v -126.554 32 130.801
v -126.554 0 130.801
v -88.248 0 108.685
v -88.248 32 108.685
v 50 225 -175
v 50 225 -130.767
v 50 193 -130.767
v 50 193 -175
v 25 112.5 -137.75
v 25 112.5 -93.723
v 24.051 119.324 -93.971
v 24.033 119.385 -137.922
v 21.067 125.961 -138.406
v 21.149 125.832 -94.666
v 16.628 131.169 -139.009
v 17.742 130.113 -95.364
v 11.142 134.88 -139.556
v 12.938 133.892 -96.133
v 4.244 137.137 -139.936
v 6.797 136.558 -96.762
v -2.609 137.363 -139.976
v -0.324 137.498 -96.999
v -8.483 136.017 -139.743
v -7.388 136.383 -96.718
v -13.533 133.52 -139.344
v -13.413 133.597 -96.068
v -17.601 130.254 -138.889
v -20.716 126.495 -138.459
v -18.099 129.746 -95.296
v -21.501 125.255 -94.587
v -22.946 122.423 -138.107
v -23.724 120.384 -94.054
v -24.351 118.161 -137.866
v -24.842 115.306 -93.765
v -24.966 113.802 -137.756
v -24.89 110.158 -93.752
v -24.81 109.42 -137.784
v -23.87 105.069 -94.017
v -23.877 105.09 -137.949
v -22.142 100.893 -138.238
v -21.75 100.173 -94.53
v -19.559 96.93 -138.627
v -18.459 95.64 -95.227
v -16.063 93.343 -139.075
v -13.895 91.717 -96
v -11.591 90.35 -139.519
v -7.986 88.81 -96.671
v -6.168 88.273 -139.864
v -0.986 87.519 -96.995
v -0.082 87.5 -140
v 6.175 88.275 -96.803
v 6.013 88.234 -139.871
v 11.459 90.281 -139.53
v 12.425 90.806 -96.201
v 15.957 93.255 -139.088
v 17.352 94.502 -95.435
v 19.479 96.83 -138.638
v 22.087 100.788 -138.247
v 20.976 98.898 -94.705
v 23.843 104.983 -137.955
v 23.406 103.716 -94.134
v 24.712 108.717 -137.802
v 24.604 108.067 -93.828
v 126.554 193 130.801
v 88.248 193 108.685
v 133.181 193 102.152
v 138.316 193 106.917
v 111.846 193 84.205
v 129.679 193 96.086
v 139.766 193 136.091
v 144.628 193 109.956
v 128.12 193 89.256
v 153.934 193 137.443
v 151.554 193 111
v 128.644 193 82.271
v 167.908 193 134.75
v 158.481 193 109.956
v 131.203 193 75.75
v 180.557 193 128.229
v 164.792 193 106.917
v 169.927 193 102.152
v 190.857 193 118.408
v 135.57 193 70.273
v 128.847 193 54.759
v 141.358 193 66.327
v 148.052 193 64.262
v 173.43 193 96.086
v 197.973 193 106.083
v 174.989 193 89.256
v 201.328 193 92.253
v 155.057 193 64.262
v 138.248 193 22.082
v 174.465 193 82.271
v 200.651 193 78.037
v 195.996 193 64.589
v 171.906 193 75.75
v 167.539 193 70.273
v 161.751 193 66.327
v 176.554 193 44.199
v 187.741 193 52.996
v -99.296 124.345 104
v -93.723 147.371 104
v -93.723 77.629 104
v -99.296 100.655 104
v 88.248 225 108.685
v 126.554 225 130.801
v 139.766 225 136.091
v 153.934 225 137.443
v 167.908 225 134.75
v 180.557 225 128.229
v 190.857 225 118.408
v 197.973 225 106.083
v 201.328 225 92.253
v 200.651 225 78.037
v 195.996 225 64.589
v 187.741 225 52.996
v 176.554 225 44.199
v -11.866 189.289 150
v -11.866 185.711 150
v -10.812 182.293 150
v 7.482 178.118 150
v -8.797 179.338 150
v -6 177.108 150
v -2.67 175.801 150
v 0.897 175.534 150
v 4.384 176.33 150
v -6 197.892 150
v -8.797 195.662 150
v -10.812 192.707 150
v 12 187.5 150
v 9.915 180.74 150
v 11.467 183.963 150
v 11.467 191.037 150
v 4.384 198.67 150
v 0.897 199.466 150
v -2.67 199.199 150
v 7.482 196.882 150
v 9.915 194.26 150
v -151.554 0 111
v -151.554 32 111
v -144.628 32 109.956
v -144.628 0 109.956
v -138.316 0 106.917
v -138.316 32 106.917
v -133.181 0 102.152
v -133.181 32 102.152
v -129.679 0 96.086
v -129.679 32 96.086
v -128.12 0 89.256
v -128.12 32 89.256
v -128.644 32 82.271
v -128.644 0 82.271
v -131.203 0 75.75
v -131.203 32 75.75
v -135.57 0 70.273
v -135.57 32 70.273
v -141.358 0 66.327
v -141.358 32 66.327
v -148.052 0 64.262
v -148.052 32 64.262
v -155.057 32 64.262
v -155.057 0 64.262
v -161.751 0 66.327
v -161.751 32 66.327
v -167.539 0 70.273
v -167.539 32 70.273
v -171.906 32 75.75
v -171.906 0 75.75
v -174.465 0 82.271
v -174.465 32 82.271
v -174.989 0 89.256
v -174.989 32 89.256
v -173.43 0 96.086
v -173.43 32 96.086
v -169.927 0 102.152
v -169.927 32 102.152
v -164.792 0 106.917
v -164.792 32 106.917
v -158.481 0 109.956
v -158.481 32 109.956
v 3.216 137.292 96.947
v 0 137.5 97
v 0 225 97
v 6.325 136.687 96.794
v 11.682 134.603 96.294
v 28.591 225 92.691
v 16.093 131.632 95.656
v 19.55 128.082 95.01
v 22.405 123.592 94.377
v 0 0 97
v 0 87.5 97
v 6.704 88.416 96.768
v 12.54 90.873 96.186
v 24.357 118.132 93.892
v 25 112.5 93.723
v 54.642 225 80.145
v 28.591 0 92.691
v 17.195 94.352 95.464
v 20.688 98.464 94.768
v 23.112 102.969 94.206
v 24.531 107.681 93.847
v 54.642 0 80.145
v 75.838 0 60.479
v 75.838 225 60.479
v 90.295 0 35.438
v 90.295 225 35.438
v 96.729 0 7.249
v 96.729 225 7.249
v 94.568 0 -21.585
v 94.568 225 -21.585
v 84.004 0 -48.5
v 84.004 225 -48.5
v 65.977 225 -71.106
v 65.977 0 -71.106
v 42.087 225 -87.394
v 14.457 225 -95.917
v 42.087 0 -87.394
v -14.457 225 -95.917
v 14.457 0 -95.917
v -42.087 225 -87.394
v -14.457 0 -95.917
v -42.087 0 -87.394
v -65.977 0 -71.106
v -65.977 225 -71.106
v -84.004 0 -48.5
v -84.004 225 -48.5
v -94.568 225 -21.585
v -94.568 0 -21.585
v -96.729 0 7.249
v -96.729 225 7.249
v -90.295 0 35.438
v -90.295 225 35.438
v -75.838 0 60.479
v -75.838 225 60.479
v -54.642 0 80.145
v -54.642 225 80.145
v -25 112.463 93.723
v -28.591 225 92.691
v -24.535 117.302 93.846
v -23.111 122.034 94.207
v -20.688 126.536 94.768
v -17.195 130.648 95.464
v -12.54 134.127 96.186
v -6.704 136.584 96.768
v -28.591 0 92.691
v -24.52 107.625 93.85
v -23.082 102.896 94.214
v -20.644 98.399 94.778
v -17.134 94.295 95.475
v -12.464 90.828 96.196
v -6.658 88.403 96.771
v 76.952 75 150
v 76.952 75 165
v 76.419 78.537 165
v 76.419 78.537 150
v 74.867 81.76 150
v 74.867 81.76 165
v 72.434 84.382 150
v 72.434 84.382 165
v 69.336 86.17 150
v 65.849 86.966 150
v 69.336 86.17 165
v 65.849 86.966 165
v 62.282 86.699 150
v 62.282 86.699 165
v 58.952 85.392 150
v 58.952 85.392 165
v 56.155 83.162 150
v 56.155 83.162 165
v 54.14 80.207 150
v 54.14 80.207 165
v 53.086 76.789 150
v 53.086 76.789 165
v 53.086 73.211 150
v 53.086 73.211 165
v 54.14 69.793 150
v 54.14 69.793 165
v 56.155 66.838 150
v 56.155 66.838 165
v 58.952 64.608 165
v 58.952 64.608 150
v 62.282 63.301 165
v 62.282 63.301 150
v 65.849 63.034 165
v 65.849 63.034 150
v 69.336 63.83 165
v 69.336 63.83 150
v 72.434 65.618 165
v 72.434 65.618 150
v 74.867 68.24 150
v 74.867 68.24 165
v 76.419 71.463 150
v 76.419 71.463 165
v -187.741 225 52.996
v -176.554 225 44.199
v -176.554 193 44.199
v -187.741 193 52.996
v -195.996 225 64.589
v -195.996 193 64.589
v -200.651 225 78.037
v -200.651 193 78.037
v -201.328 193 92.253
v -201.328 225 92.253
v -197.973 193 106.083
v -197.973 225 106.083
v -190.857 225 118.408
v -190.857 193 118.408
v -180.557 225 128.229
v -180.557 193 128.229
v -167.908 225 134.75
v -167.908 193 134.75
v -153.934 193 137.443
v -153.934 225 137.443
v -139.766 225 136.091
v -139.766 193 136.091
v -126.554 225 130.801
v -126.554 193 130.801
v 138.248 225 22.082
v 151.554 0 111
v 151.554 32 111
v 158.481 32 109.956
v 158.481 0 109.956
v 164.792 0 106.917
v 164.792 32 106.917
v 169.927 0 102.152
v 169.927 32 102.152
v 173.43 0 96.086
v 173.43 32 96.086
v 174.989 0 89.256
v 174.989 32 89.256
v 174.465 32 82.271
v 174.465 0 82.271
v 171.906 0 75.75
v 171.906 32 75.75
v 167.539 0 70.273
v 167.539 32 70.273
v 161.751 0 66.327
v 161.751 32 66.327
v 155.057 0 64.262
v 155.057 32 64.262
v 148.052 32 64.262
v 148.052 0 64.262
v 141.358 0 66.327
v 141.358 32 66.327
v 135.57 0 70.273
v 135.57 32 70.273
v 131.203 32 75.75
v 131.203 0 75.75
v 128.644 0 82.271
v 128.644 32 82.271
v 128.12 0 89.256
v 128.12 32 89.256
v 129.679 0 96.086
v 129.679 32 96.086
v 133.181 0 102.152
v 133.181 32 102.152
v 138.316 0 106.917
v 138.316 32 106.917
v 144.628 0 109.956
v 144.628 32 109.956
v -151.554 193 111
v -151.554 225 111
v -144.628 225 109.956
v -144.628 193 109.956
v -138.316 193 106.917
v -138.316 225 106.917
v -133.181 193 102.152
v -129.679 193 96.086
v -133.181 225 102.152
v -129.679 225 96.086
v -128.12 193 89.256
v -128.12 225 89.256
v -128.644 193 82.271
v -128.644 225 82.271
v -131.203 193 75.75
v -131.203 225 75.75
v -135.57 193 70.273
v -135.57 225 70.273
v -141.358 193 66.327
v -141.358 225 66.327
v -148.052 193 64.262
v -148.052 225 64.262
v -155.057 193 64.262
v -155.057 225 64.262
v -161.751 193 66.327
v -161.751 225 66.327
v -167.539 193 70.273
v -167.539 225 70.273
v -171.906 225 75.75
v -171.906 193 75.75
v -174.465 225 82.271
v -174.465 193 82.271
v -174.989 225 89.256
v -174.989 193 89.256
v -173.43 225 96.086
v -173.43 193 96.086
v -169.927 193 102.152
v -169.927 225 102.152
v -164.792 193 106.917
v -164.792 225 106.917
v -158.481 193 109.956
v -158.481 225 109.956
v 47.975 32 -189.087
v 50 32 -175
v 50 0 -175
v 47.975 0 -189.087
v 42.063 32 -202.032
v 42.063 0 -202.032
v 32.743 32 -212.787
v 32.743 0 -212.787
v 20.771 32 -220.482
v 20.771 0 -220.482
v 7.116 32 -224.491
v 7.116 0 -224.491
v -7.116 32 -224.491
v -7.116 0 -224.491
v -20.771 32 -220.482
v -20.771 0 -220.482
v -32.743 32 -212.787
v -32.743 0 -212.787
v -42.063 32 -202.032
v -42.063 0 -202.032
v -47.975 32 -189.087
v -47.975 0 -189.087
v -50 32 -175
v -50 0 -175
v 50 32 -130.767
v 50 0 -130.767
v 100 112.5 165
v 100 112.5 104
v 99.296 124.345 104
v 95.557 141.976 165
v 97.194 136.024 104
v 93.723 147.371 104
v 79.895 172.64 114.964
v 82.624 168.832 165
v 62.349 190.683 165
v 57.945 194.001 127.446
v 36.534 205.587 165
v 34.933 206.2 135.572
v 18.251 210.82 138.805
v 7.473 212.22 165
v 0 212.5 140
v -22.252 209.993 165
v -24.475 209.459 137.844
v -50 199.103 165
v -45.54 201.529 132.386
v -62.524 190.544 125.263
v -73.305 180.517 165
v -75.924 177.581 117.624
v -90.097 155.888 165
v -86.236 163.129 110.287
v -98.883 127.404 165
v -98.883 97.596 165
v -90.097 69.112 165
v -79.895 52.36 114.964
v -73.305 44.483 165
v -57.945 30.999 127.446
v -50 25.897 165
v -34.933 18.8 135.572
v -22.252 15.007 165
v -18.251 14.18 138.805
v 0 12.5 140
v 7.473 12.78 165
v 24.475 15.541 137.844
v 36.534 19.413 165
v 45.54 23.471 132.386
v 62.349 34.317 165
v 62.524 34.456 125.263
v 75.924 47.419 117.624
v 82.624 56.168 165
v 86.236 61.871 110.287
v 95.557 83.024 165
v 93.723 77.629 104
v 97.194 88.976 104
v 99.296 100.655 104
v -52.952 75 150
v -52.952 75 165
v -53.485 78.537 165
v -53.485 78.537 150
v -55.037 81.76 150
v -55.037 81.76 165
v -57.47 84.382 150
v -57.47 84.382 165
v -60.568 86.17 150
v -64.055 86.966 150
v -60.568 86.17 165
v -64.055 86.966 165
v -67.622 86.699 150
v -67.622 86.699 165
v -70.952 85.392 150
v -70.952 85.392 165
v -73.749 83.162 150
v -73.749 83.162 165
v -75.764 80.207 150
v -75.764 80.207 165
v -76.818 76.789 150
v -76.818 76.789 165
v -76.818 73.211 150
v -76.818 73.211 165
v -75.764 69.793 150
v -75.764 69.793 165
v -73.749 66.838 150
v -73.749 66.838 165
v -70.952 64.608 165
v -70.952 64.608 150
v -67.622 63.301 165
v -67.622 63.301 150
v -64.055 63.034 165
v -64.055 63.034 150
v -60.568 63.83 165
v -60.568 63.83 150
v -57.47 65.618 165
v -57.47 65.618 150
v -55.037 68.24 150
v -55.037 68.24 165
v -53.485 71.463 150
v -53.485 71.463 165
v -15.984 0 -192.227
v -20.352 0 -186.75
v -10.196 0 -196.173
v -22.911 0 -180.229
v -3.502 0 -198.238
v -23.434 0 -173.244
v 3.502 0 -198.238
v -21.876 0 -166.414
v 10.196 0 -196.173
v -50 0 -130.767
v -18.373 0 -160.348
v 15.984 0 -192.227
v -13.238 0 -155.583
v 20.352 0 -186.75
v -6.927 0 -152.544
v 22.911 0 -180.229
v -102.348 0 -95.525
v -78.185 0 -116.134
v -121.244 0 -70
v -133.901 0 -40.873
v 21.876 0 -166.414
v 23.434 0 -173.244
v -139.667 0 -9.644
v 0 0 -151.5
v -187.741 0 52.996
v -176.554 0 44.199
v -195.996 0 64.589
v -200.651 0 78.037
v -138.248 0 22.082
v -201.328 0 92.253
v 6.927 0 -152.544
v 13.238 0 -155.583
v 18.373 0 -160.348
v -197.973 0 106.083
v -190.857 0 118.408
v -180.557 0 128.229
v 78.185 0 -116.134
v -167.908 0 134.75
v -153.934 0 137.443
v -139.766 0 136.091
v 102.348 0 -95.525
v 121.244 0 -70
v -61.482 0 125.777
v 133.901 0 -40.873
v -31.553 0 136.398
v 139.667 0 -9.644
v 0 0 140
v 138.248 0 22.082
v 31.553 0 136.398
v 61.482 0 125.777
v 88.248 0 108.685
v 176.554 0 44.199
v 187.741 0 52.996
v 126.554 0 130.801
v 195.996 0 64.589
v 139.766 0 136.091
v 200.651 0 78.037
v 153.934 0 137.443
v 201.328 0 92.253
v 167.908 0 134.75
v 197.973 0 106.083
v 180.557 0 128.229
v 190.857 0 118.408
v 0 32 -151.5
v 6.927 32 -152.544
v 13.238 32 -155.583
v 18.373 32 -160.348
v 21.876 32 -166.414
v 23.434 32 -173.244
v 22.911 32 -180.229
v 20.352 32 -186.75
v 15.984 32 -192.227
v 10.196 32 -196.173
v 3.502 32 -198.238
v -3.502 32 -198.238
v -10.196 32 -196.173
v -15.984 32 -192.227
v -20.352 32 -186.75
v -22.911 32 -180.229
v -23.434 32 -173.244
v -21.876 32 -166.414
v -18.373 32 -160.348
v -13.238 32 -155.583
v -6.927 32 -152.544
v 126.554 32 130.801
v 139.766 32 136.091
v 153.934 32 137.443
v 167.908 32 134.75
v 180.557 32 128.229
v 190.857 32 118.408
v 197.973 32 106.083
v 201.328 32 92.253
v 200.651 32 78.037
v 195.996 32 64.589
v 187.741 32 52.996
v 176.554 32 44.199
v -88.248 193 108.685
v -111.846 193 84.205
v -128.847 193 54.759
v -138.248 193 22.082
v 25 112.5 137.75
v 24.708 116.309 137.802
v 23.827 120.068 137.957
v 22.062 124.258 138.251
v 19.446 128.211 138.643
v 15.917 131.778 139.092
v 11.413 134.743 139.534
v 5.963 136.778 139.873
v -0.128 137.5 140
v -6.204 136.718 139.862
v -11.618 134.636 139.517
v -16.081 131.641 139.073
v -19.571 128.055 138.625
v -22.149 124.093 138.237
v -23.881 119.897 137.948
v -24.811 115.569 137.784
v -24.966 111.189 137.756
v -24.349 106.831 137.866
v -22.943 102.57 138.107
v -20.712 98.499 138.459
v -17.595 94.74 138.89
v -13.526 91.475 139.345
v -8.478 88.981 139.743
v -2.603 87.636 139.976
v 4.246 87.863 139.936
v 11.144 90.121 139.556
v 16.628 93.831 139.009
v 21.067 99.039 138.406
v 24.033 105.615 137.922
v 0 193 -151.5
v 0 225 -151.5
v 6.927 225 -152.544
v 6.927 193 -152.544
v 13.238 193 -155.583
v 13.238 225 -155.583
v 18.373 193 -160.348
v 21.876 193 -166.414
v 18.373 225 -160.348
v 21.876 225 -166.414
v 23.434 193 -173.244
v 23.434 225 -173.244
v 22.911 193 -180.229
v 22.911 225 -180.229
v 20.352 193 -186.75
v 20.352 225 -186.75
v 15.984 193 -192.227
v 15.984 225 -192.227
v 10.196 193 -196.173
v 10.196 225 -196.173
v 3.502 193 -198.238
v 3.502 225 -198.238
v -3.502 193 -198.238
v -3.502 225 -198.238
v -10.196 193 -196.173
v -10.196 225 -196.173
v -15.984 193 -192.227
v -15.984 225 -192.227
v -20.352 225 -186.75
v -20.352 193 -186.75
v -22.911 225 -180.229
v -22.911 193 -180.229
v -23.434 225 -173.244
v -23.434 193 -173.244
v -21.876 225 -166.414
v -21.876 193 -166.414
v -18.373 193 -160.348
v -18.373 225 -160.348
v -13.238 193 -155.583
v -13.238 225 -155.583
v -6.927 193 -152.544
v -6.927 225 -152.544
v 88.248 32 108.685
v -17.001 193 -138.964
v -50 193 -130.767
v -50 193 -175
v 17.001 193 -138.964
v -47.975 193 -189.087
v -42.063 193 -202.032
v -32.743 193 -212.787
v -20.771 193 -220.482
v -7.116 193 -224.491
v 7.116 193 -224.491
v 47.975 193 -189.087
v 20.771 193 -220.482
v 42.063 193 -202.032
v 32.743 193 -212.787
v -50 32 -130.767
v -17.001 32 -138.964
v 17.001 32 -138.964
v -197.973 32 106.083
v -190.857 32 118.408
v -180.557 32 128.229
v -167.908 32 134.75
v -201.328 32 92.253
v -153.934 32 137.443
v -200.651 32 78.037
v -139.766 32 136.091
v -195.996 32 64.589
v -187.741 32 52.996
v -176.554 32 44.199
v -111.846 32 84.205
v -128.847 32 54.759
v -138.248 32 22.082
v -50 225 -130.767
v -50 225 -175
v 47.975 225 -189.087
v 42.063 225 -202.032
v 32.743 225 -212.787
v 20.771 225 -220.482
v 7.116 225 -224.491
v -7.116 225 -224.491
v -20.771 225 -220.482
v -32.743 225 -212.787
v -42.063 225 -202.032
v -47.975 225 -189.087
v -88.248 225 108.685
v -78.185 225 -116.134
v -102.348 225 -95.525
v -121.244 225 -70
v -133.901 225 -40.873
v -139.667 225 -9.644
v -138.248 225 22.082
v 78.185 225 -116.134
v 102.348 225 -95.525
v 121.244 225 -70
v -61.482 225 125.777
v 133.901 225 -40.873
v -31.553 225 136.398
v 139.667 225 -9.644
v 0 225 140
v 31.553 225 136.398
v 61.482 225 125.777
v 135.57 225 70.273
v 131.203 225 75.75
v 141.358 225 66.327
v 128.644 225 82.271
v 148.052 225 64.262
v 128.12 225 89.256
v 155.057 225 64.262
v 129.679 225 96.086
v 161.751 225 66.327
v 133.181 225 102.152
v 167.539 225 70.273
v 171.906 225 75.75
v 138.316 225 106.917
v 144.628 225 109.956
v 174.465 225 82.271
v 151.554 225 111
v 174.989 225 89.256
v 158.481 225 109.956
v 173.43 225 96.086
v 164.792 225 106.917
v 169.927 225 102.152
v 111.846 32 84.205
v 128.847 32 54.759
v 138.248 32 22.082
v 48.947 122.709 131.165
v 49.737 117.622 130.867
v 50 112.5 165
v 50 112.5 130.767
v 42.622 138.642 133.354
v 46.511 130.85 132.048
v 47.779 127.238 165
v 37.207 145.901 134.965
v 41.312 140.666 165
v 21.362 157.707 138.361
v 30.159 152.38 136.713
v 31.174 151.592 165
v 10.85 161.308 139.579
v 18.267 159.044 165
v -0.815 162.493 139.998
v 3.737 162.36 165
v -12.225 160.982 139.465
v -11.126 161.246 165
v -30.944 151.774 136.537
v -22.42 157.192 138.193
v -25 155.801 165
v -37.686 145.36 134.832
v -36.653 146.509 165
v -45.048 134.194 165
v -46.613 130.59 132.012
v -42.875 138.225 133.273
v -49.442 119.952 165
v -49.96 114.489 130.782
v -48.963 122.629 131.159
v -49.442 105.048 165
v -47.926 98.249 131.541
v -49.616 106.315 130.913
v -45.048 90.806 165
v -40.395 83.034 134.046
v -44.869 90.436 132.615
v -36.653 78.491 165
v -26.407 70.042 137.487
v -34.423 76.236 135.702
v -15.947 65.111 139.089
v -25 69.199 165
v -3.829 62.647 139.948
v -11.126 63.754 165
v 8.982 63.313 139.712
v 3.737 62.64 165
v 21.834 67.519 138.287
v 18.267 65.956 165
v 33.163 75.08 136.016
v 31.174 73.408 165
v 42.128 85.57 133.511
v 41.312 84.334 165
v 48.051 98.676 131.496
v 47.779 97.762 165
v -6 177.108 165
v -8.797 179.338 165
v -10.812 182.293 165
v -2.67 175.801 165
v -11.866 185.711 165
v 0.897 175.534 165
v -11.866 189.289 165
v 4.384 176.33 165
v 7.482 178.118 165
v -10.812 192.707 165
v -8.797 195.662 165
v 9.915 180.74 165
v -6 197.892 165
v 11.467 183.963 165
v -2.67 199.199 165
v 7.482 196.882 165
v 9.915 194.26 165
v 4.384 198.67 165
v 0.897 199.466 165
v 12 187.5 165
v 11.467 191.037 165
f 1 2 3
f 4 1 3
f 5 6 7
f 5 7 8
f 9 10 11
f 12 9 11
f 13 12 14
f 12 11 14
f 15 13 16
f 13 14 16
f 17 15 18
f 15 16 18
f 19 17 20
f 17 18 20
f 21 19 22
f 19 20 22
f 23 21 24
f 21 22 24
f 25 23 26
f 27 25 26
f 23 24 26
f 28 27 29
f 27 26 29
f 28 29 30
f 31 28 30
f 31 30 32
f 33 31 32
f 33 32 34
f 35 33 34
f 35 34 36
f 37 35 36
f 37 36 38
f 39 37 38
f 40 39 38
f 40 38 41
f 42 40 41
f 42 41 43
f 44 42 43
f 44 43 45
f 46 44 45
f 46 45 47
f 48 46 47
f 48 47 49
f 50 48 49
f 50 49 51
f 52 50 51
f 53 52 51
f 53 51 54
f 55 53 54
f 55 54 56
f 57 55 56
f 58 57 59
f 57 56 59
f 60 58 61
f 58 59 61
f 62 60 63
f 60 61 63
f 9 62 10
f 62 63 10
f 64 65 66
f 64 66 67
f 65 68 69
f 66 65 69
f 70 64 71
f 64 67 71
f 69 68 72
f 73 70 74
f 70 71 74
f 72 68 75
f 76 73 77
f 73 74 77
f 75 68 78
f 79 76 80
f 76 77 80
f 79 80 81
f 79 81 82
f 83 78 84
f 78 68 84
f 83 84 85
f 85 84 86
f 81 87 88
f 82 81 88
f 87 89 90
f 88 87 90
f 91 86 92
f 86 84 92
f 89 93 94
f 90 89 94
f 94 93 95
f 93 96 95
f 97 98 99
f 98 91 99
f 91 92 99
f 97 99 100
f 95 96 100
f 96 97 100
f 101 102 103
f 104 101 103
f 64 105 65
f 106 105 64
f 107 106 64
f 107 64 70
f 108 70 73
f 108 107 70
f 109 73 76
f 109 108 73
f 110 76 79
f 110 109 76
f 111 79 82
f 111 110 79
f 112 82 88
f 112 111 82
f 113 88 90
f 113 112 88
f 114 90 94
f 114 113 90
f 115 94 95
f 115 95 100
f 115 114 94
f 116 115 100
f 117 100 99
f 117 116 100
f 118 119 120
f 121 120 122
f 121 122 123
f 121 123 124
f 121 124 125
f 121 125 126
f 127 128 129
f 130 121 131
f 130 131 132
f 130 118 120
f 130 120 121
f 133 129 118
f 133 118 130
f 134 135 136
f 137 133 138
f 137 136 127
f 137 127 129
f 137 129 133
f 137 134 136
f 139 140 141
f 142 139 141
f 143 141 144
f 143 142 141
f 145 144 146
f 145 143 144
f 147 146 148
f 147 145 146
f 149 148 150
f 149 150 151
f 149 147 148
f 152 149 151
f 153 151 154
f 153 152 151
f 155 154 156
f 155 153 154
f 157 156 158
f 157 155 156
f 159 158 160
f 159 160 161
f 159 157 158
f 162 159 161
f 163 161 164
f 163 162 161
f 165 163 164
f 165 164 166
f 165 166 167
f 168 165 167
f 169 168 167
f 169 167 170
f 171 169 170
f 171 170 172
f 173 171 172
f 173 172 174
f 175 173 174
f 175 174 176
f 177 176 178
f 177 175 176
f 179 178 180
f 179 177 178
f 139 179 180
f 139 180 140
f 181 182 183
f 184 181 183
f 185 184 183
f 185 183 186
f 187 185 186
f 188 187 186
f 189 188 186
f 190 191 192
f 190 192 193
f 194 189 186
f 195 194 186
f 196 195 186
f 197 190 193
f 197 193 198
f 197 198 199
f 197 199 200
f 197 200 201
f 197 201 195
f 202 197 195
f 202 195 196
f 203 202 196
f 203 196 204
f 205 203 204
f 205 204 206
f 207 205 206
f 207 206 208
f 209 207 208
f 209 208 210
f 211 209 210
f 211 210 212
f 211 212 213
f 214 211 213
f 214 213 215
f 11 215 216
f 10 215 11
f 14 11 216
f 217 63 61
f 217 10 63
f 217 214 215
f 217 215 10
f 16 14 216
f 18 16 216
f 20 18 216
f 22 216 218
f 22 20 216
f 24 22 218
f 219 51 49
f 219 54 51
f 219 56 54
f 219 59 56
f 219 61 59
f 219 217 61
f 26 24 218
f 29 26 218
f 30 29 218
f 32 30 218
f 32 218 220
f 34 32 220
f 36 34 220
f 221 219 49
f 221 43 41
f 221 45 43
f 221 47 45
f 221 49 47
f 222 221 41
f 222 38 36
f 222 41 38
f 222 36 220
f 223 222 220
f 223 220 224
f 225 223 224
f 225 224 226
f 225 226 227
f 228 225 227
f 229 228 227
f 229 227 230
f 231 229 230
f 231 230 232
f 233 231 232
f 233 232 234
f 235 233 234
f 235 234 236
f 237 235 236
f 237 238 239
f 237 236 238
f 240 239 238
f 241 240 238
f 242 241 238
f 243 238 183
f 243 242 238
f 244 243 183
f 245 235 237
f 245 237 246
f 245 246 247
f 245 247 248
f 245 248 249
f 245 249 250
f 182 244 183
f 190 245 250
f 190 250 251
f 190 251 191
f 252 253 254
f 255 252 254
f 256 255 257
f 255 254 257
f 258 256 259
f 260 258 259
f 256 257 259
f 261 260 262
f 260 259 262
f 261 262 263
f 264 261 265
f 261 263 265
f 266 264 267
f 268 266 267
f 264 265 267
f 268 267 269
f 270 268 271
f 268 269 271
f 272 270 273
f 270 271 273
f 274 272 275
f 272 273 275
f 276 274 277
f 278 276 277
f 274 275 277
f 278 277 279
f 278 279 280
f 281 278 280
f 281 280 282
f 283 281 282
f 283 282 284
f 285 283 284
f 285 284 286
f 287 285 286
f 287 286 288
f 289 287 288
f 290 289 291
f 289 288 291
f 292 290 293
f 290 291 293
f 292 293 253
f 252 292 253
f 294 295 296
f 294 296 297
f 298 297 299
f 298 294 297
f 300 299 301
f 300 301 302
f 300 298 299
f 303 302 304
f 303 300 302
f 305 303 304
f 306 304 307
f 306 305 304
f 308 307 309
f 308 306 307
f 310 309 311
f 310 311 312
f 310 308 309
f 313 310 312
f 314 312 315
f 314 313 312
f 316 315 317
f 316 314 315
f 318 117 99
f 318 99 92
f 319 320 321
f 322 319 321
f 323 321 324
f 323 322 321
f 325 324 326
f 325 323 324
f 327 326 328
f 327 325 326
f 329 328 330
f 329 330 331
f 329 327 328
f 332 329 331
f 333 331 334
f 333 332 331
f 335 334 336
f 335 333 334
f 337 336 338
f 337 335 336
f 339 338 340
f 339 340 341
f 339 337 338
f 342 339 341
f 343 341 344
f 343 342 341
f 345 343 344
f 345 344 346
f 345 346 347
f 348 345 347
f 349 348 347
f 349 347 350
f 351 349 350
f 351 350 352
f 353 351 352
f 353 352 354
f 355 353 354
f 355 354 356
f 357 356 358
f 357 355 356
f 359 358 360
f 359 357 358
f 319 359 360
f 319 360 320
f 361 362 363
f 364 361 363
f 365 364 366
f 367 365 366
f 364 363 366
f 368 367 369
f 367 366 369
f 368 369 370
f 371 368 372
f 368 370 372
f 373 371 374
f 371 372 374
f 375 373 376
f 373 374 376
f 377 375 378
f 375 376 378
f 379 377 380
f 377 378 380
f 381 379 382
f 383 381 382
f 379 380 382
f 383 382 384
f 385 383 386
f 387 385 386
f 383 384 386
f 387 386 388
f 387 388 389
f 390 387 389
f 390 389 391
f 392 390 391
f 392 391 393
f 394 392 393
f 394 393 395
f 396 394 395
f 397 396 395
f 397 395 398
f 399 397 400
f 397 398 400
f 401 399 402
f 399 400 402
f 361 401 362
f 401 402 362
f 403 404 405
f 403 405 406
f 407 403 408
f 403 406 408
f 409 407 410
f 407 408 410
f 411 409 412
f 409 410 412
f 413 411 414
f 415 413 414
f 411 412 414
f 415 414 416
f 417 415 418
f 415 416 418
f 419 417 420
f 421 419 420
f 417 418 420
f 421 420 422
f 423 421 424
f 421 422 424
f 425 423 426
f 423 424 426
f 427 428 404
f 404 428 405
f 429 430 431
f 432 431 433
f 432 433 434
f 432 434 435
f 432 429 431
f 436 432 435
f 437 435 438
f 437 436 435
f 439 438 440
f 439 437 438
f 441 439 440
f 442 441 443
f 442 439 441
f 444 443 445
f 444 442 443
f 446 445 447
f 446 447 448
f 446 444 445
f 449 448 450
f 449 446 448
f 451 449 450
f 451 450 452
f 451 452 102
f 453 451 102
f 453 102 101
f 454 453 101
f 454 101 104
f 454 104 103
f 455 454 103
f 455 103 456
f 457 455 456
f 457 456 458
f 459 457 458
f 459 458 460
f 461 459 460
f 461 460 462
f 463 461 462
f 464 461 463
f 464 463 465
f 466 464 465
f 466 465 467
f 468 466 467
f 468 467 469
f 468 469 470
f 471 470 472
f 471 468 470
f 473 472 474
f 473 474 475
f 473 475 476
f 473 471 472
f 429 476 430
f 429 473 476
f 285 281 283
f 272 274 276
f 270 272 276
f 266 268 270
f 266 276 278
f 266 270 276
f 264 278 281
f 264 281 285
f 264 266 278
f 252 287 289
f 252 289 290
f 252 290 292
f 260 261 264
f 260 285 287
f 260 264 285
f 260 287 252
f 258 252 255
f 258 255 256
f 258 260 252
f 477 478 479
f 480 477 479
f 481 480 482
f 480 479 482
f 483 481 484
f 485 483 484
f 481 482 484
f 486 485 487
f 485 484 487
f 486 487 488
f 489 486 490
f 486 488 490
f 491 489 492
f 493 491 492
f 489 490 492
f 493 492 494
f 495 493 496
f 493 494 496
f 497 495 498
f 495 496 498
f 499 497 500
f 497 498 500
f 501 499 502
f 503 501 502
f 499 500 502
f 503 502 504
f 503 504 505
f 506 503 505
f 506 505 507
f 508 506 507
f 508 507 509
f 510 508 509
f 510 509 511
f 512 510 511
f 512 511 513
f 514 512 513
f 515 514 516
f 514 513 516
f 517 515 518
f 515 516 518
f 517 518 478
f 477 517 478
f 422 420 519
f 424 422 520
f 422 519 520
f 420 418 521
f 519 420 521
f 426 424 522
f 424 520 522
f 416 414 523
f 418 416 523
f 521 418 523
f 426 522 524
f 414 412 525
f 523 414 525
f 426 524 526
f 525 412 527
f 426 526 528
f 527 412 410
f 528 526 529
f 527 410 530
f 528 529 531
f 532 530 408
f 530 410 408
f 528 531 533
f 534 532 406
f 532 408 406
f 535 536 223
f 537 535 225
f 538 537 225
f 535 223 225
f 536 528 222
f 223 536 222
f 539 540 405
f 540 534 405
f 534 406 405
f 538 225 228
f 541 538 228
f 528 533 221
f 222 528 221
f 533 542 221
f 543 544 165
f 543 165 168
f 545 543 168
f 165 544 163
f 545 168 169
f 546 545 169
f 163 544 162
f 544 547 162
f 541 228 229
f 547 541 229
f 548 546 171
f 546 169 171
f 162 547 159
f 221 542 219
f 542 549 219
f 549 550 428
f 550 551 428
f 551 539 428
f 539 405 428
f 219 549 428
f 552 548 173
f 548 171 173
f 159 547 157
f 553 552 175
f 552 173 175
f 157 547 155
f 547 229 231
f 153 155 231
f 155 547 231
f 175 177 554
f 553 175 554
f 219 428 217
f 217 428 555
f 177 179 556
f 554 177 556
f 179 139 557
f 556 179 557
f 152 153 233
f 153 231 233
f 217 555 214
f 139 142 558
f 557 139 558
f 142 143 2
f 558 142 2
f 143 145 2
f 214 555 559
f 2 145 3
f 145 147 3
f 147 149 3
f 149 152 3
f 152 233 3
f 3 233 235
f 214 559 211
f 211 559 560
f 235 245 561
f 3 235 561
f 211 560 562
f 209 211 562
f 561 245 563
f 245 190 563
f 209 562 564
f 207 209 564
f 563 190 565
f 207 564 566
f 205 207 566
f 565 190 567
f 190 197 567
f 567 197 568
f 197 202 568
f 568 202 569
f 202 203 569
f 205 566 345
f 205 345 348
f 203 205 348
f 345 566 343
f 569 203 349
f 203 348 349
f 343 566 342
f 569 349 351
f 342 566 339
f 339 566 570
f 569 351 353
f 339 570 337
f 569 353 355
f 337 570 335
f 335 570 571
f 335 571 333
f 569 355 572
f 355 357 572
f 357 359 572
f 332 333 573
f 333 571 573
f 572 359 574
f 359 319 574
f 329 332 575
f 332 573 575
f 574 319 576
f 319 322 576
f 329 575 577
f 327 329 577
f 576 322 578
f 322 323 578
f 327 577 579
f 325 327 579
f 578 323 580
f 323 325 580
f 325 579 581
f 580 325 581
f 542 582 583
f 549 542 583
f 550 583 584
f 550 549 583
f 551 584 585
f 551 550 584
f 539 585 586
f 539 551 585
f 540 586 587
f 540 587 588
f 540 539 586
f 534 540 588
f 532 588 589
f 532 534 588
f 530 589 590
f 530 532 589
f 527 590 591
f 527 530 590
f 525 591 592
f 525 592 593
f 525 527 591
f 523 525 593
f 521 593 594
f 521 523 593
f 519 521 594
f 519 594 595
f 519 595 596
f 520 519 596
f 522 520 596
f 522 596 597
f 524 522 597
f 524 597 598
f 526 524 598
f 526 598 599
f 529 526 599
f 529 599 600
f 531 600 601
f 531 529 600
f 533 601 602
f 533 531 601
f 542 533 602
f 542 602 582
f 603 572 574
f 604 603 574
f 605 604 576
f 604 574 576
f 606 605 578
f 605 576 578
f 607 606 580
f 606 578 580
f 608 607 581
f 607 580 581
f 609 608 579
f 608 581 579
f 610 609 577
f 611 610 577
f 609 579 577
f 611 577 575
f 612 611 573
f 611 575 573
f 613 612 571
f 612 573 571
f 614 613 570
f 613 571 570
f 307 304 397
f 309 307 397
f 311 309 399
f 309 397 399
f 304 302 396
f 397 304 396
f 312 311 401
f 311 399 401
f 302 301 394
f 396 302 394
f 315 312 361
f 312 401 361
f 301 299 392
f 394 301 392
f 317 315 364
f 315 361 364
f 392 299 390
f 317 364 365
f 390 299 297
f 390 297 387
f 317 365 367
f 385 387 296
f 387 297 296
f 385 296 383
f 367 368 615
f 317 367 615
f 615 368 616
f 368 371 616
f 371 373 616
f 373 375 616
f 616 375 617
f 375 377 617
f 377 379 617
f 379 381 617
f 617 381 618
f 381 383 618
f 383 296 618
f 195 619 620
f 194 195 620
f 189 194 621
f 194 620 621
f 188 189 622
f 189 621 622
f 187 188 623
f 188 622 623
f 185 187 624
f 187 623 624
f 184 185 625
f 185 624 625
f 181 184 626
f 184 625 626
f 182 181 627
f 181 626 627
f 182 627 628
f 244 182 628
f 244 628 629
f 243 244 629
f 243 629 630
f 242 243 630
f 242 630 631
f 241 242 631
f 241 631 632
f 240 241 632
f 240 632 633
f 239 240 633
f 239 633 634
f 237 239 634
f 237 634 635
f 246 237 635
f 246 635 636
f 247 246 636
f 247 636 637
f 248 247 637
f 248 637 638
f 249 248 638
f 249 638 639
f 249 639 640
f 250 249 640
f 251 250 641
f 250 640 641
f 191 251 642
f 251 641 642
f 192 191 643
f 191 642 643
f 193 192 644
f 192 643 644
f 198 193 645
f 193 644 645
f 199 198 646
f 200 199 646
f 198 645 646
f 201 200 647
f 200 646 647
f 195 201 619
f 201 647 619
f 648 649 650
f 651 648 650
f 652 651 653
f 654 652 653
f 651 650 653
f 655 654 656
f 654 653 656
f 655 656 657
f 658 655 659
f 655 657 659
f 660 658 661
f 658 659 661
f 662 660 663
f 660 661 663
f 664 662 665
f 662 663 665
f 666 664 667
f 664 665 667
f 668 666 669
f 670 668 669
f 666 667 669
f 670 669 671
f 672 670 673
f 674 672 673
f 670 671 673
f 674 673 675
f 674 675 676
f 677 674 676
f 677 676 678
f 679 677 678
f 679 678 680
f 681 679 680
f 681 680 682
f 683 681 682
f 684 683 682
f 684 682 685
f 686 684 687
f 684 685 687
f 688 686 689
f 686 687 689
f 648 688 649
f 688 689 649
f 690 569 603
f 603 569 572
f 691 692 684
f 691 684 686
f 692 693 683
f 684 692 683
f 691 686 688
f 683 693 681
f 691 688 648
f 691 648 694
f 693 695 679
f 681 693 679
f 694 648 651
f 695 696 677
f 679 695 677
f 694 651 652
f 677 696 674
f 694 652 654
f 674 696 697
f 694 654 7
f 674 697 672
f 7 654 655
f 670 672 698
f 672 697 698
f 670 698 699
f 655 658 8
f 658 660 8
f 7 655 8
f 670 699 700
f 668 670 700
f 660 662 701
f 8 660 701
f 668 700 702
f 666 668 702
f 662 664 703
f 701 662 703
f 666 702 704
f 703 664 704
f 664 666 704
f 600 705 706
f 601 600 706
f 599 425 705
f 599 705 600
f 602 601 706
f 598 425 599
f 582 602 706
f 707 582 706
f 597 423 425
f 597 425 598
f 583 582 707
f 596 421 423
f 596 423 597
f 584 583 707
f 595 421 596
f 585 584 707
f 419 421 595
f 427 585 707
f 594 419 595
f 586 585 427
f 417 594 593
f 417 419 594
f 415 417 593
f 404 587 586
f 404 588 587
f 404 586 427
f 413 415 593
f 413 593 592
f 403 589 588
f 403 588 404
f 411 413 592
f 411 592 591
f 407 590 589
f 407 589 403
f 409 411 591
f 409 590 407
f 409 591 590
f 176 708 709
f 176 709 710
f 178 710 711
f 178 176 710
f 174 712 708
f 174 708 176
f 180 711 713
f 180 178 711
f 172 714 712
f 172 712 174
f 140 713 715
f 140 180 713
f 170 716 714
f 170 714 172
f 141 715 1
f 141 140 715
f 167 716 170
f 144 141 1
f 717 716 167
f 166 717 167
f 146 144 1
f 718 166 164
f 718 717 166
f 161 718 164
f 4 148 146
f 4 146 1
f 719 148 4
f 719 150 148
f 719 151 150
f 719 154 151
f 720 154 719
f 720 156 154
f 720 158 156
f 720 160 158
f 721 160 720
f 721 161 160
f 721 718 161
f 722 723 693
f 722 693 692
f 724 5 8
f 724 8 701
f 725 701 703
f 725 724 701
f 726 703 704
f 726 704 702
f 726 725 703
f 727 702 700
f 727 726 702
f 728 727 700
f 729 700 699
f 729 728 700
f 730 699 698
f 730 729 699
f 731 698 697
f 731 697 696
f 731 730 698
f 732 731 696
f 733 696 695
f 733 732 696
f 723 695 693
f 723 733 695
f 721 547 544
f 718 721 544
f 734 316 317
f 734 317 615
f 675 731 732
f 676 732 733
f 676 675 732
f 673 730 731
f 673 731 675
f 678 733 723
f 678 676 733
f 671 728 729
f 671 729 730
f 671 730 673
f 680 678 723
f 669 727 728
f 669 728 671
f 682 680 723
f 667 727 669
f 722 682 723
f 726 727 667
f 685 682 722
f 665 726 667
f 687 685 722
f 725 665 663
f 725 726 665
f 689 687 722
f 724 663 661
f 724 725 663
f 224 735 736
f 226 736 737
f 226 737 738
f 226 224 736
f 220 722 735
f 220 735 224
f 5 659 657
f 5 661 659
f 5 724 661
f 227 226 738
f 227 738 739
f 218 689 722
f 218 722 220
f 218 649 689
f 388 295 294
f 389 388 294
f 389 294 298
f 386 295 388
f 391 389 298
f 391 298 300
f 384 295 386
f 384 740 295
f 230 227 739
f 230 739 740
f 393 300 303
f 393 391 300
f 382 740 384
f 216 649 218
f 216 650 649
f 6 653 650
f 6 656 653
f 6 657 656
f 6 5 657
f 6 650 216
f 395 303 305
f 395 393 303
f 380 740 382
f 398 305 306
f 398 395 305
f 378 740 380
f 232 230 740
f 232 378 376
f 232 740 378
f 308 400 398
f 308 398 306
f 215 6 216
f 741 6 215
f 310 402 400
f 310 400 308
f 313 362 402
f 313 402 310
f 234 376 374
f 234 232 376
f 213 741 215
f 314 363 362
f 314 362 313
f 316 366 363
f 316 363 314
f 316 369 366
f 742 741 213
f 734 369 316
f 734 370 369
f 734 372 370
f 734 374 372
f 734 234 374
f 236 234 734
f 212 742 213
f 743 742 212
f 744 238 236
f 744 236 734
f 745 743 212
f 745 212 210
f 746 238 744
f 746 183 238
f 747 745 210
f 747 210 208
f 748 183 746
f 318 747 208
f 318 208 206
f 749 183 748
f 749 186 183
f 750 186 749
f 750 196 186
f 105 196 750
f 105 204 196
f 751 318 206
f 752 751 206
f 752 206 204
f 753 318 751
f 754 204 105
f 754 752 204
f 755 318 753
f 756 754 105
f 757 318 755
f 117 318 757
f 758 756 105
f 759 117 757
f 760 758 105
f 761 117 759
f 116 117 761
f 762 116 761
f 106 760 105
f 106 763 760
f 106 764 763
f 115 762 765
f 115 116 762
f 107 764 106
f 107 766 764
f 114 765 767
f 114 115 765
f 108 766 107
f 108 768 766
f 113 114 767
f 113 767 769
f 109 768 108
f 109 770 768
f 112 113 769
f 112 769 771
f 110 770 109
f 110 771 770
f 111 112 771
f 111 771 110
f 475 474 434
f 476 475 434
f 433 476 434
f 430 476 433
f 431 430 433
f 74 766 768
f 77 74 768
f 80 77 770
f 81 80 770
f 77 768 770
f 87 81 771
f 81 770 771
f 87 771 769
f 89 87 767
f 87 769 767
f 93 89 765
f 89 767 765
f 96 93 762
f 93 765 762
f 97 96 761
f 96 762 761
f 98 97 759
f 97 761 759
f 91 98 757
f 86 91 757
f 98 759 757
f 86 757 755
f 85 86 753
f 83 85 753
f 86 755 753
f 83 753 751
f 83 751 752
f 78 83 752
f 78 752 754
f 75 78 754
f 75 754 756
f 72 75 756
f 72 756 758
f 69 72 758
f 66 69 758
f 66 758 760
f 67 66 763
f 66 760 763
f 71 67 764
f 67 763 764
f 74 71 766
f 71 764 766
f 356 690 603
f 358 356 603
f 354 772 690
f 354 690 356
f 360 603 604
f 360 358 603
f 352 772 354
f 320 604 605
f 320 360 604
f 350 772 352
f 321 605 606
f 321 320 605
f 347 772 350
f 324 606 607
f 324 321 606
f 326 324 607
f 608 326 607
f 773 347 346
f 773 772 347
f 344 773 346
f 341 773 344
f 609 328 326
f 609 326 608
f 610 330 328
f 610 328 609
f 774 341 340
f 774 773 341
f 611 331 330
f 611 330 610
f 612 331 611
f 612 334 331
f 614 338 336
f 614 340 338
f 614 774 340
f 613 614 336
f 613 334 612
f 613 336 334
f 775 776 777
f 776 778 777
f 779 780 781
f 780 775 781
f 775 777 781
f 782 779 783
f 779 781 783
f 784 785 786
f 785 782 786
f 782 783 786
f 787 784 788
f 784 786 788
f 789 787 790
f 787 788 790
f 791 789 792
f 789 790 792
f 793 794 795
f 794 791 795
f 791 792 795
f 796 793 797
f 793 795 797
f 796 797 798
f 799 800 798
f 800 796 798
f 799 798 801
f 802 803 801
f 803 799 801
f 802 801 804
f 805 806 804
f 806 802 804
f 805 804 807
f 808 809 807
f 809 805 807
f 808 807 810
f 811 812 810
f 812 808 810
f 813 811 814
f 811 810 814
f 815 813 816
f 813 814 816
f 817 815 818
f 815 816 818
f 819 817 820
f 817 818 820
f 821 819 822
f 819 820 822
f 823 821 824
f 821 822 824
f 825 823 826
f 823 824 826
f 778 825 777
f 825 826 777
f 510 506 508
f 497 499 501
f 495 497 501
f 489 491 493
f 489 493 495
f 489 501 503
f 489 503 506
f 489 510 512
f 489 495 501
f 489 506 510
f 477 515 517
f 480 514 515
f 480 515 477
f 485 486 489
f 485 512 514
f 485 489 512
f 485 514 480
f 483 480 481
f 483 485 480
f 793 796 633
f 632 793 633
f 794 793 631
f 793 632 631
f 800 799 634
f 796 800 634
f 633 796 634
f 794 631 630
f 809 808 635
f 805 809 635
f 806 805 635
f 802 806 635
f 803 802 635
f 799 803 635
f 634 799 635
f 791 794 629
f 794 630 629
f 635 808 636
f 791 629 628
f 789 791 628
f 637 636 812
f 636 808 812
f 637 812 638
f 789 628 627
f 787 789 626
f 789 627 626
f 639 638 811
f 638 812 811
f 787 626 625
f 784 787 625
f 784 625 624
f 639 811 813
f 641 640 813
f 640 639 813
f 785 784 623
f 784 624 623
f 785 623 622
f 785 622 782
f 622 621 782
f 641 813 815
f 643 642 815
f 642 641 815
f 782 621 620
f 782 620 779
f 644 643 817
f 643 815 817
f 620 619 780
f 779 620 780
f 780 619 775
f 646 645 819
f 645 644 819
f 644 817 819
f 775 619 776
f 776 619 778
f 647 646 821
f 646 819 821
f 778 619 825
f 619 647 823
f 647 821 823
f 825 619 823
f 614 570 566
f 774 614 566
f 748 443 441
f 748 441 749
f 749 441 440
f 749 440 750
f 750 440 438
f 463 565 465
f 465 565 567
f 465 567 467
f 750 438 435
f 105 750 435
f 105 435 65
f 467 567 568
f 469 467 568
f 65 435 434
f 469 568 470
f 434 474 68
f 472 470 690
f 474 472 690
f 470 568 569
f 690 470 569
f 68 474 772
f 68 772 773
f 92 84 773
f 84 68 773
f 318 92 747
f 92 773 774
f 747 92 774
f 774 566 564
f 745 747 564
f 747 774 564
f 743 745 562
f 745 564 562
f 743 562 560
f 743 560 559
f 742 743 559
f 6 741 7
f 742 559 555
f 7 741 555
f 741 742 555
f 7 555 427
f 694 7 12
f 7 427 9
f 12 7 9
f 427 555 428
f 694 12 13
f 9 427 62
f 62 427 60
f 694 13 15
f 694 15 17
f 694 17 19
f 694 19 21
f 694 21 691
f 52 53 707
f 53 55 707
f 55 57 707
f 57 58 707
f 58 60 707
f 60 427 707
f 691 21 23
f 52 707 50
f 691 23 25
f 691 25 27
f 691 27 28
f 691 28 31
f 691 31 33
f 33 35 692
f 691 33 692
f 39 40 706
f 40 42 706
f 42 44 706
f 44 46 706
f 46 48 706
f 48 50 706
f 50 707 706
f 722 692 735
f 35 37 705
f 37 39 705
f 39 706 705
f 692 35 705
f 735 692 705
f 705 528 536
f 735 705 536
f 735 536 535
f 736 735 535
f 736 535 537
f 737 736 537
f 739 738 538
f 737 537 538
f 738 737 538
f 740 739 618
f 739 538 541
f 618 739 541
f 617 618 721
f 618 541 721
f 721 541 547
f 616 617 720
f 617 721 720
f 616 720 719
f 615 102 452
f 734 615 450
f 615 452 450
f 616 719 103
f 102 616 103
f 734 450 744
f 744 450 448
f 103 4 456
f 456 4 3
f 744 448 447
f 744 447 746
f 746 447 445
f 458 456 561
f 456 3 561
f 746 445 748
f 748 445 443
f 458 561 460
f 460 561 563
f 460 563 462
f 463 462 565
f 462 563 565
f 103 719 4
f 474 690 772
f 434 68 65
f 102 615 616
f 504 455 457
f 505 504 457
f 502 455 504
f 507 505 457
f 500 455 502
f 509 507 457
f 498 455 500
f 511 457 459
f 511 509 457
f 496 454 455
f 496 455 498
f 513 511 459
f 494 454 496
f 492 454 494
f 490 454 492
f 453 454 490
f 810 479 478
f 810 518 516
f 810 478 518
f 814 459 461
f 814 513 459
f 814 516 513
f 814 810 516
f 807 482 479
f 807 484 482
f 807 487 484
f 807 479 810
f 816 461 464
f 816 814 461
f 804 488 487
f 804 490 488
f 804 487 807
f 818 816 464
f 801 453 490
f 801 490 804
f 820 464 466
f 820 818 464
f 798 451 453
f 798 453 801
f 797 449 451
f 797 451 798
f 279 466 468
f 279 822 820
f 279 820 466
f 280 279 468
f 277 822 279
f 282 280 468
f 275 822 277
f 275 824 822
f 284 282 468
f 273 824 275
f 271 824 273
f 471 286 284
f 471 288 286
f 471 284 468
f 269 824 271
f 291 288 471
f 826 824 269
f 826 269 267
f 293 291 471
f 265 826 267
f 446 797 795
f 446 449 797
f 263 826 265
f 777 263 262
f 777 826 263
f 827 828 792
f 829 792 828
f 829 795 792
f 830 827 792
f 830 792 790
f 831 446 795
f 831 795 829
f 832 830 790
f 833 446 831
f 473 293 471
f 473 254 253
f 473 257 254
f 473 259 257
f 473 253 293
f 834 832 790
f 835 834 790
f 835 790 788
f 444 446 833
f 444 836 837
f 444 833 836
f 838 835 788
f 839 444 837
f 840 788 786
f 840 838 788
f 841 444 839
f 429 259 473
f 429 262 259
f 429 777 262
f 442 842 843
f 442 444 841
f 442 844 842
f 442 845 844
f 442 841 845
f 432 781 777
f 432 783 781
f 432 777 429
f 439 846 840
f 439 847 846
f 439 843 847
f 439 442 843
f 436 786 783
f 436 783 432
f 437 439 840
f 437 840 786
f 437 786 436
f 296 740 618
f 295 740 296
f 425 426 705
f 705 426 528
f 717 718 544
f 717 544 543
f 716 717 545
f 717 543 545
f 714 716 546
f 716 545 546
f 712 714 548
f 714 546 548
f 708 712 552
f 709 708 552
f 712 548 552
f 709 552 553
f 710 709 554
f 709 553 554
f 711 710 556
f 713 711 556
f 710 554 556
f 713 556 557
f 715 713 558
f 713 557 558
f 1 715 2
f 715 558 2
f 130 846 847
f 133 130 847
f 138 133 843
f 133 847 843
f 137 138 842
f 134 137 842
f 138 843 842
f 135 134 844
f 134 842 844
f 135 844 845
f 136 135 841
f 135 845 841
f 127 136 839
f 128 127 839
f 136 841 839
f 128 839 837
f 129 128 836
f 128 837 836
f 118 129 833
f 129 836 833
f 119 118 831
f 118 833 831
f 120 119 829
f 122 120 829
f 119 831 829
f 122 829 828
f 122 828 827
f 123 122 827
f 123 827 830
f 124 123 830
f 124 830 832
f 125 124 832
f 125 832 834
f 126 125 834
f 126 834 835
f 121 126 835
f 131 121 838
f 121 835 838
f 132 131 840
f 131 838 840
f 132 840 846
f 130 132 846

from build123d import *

# Parameters (mm, degrees)
SKETCH1_R            = 97
BOSS_EXTRUDE7_DEPTH  = 225
SKETCH1_5_R          = 23.5
BOSS_EXTRUDE9_DEPTH  = 32
SKETCH2_R            = 100
SKETCH2_R_2          = 50
BOSS_EXTRUDE11_DEPTH = 61
SKETCH2_4_R          = 12
CUT_EXTRUDE1_DEPTH   = 15
SKETCH2_5_R          = 25
CUT_EXTRUDE2_DEPTH   = 547


with BuildPart() as part:
    # Sketch1 → Boss-Extrude7 (new body)
    with BuildSketch(Plane(origin=(0, 0, 0), x_dir=(1, 0, 0), z_dir=(0, 1, 0))):
        with BuildLine():
            ThreePointArc((140, 0), (115.325625947, 79.372539332), (50, 130.766968306))
            ThreePointArc((50, 130.766968306), (0, 140), (-50, 130.766968306))
            ThreePointArc((-50, 130.766968306), (-121.24355653, 70), (-138.247516529, -22.082213964))
            ThreePointArc((-138.247516529, -22.082213964), (-121.24355653, -70), (-88.247516529, -108.684754342))
            ThreePointArc((-88.247516529, -108.684754342), (0, -140), (88.247516529, -108.684754342))
            ThreePointArc((88.247516529, -108.684754342), (121.24355653, -70), (138.247516529, -22.082213964))
            ThreePointArc((138.247516529, -22.082213964), (139.561191443, -11.075822451), (140, 0))
        make_face()
        Circle(SKETCH1_R, mode=Mode.SUBTRACT)
    extrude(amount=BOSS_EXTRUDE7_DEPTH)

    # Sketch1<5> → Boss-Extrude9 (add)
    # profile 1 of 3: a face of its own
    with BuildSketch(Plane(origin=(0, 0, 0), x_dir=(1, 0, 0), z_dir=(0, 1, 0))):
        with BuildLine():
            Line((50, 130.766968306), (50, 175))
            ThreePointArc((50, 175), (0, 225), (-50, 175))
            Line((-50, 175), (-50, 130.766968306))
            ThreePointArc((-50, 130.766968306), (0, 140), (50, 130.766968306))
        make_face()
        with Locations((0, 175)):
            Circle(SKETCH1_5_R, mode=Mode.SUBTRACT)
    # profile 2 of 3: a face of its own
    with BuildSketch(Plane(origin=(0, 0, 0), x_dir=(1, 0, 0), z_dir=(0, 1, 0))):
        with BuildLine():
            Line((176.554445662, -44.198729811), (138.247516529, -22.082213964))
            ThreePointArc((138.247516529, -22.082213964), (121.24355653, -70), (88.247516529, -108.684754342))
            Line((88.247516529, -108.684754342), (126.554445662, -130.801270189))
            ThreePointArc((126.554445662, -130.801270189), (194.855715852, -112.5), (176.554445662, -44.198729811))
        make_face()
        with Locations((151.554445662, -87.5)):
            Circle(SKETCH1_5_R, mode=Mode.SUBTRACT)
    # profile 3 of 3: a face of its own
    with BuildSketch(Plane(origin=(0, 0, 0), x_dir=(1, 0, 0), z_dir=(0, 1, 0))):
        with BuildLine():
            ThreePointArc((-88.247516529, -108.684754342), (-121.24355653, -70), (-138.247516529, -22.082213964))
            Line((-138.247516529, -22.082213964), (-176.554445662, -44.198729811))
            ThreePointArc((-176.554445662, -44.198729811), (-194.855715851, -112.5), (-126.554445662, -130.801270189))
            Line((-126.554445662, -130.801270189), (-88.247516529, -108.684754342))
        make_face()
        with Locations((-151.554445662, -87.5)):
            Circle(SKETCH1_5_R, mode=Mode.SUBTRACT)
    boss_extrude9 = extrude(amount=BOSS_EXTRUDE9_DEPTH)

    # Mirror1: Boss-Extrude9 across plane
    add(boss_extrude9.mirror(Plane.ZX.offset(112.5)))

    # Sketch2 → Boss-Extrude11 (add)
    with BuildSketch(Plane.XY.offset(165)):
        with Locations((0, 112.5)):
            Circle(SKETCH2_R)
        with Locations((0, 112.5)):
            Circle(SKETCH2_R_2, mode=Mode.SUBTRACT)
    extrude(amount=-BOSS_EXTRUDE11_DEPTH)

    # Sketch2<4> → Cut-Extrude1 (cut)
    with BuildSketch(Plane.XY.offset(165)):
        with Locations((0, 187.5)):
            Circle(SKETCH2_4_R)
        with Locations((64.951905284, 75)):
            Circle(SKETCH2_4_R)
        with Locations((-64.951905284, 75)):
            Circle(SKETCH2_4_R)
    extrude(amount=-CUT_EXTRUDE1_DEPTH, mode=Mode.SUBTRACT)

    # Sketch2<5> → Cut-Extrude2 (cut)
    with BuildSketch(Plane.XY.offset(165)):
        with Locations((0, 112.5)):
            Circle(SKETCH2_5_R)
    extrude(amount=-CUT_EXTRUDE2_DEPTH, mode=Mode.SUBTRACT)


solid = part.part
